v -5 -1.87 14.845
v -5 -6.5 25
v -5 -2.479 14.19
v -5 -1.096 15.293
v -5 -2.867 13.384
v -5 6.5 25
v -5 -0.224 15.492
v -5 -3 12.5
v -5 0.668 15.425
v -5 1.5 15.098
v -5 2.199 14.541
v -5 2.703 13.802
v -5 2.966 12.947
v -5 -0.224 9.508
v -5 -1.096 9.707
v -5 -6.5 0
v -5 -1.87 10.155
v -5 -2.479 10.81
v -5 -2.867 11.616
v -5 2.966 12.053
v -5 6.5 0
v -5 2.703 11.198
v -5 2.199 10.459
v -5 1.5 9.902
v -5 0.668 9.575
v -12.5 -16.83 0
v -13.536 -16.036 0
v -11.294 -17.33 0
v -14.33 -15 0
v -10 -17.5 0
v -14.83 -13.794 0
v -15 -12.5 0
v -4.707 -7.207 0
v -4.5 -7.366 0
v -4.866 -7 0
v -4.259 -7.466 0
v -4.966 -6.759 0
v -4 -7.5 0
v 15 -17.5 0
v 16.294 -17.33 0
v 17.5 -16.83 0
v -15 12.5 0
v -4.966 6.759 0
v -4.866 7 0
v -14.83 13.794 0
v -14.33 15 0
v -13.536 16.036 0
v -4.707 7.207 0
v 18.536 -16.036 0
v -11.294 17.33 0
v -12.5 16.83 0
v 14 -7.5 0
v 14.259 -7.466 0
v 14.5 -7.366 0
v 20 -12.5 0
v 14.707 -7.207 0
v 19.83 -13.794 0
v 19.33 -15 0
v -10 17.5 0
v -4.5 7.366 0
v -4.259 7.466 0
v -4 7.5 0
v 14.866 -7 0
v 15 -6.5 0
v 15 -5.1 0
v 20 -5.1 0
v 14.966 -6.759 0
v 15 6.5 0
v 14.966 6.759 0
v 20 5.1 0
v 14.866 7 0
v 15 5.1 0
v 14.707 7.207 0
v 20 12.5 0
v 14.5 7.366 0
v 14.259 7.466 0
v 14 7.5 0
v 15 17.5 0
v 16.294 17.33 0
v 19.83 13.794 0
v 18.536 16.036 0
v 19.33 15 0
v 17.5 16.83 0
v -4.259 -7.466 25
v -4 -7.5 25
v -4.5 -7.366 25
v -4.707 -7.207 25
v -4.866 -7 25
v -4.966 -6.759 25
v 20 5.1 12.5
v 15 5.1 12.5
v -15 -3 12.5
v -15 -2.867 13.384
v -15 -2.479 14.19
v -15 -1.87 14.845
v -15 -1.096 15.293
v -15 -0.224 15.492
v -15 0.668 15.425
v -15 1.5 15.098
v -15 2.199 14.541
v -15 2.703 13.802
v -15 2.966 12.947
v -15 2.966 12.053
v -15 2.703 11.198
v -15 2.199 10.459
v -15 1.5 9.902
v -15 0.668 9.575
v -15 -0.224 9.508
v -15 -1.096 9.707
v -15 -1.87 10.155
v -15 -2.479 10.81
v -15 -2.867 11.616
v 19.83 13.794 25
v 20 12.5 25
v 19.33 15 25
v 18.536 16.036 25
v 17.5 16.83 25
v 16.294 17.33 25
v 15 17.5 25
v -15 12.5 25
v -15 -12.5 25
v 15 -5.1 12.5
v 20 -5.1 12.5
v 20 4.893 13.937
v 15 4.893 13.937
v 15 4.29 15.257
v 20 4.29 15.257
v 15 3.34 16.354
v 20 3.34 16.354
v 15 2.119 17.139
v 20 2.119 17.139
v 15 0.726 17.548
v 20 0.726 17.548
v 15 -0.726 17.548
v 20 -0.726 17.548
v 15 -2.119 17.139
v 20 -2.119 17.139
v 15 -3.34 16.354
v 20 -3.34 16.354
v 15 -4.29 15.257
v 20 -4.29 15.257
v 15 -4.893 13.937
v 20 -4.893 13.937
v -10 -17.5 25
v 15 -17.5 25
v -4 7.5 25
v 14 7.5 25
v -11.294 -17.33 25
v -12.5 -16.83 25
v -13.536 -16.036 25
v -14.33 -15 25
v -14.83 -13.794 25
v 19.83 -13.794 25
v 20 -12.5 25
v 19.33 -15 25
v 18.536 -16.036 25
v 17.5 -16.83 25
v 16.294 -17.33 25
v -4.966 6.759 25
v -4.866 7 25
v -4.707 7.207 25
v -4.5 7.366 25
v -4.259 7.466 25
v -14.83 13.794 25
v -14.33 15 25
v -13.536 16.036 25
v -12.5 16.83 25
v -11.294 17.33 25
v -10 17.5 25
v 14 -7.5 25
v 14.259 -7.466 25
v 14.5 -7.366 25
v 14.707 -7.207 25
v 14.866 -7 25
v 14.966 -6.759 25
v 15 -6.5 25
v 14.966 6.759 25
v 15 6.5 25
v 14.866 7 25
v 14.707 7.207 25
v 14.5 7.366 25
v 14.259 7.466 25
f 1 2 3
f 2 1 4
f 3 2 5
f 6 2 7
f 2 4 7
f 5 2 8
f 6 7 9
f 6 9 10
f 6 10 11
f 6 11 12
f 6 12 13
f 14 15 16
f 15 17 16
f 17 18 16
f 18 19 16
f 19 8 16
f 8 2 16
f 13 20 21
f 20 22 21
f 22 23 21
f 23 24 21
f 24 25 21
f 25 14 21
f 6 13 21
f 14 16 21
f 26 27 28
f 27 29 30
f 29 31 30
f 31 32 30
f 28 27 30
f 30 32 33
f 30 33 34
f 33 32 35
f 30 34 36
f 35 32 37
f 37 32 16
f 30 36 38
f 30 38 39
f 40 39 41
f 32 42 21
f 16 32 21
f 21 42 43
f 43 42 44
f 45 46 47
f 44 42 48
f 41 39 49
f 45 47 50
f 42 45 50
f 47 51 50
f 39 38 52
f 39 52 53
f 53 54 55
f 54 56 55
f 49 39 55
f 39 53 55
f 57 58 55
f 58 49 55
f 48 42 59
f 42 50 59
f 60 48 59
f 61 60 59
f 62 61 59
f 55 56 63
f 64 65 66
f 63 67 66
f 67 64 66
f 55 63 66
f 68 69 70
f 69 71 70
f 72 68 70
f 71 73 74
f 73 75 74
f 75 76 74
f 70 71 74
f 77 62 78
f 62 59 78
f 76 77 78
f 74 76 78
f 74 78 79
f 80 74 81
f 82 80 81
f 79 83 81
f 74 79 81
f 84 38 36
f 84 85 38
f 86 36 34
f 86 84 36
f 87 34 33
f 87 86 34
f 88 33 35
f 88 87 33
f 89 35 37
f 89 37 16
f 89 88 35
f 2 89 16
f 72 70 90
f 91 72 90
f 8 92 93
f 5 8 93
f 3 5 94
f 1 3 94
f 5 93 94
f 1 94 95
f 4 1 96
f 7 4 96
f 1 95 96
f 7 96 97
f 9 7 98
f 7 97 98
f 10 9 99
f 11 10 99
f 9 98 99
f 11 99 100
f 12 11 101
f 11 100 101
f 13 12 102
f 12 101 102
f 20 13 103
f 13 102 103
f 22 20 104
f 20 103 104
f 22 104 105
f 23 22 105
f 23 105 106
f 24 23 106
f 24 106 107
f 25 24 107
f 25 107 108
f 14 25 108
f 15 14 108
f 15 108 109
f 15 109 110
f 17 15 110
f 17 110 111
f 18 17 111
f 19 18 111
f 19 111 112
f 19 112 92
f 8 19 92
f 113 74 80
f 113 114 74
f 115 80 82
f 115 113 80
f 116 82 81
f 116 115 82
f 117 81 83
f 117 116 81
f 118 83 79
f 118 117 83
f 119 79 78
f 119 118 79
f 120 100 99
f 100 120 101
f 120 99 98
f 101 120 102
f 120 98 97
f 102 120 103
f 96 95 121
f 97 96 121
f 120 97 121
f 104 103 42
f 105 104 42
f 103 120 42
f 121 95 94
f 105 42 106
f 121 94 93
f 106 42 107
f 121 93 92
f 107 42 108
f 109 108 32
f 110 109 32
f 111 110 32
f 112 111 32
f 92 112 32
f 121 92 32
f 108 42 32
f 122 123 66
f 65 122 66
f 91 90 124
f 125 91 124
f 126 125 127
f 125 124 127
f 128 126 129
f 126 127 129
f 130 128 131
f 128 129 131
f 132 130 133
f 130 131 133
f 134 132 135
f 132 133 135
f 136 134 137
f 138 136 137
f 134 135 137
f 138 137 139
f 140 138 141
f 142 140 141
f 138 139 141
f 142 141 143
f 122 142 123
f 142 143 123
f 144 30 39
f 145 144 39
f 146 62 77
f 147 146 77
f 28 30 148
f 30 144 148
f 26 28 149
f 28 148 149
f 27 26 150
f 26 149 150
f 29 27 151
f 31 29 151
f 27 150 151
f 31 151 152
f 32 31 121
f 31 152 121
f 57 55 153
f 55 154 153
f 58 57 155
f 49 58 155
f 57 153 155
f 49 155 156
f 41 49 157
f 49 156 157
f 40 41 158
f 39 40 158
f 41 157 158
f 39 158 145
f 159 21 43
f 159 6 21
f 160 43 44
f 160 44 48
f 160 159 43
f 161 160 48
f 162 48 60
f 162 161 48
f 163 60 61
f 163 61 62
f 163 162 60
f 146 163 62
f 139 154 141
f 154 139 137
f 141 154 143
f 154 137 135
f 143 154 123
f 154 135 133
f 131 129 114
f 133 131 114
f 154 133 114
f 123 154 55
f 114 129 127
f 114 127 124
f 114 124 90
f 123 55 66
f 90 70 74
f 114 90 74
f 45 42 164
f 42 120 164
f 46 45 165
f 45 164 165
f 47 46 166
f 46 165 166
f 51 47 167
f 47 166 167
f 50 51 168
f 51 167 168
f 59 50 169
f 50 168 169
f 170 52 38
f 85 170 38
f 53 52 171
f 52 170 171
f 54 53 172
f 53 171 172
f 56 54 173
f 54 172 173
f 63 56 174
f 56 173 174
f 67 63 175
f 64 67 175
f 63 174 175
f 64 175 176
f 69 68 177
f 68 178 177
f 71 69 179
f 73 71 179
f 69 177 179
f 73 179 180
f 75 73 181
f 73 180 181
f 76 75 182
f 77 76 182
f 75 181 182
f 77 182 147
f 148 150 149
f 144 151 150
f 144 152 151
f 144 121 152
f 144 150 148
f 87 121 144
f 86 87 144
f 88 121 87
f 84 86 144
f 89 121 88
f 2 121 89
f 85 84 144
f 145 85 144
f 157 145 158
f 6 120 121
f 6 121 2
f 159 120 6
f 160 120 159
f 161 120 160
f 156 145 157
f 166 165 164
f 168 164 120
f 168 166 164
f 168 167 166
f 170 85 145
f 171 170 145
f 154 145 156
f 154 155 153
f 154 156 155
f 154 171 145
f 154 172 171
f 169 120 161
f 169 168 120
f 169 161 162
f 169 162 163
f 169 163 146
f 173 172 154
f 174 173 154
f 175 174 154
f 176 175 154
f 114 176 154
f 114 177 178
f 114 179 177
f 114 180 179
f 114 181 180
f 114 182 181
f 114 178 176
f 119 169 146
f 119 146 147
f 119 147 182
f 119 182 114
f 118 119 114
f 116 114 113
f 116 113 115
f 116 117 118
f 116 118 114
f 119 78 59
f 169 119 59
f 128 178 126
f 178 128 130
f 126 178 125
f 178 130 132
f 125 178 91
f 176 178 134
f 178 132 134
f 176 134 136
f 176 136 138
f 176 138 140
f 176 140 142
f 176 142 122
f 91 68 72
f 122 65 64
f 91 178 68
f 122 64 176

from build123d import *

# Parameters (mm, degrees)
F0_W     = 10
F0_H     = 15
F0_W_2   = 5
F0_H_2   = 10.2
F1_DEPTH = 25
F3_DEPTH = 15
F4_R     = 3
F5_DEPTH = 25
F6_R     = 1
F7_R     = 5


with BuildPart() as f1:
    # F0 (on Top) → F1 (new body)
    with BuildSketch(Plane.XY):
        Polygon((15, -17.5), (15, -7.5), (-5, -7.5), (-15, -7.5), (-15, -17.5), align=None)
        with Locations((-10, 0)):
            Rectangle(F0_W, F0_H)
        Polygon((-15, 7.5), (-5, 7.5), (15, 7.5), (15, 17.5), (-15, 17.5), align=None)
        Polygon((15, 7.5), (15, 5.1), (20, 5.1), (20, 17.5), (15, 17.5), align=None)
        with Locations((17.5, 0)):
            Rectangle(F0_W_2, F0_H_2)
        Polygon((15, -5.1), (15, -7.5), (15, -17.5), (20, -17.5), (20, -5.1), align=None)
    extrude(amount=F1_DEPTH)

    # F2 (on face) → F3 (cut)
    with BuildSketch(Plane.YZ.offset(20)):
        with BuildLine():
            ThreePointArc((-5.1, 12.5), (0, 7.4), (5.1, 12.5))
            ThreePointArc((5.1, 12.5), (0, 17.6), (-5.1, 12.5))
        make_face()
        with BuildLine():
            Line((5.1, 0), (5.1, 12.5))
            ThreePointArc((5.1, 12.5), (0, 7.4), (-5.1, 12.5))
            Line((-5.1, 12.5), (-5.1, 0))
            Line((-5.1, 0), (5.1, 0))
        make_face()
    extrude(amount=-F3_DEPTH, mode=Mode.SUBTRACT)

    # F4 (on face) → F5 (cut)
    with BuildSketch(Plane(origin=(-15, 0, 0), x_dir=(0, -1, 0), z_dir=(-1, 0, 0))):
        with Locations((0, 12.5)):
            Circle(F4_R)
    extrude(amount=-F5_DEPTH, mode=Mode.SUBTRACT)

    # F6
    f6_edges = [f1.edges().sort_by_distance(p)[0] for p in [
        (15, -7.5, 12.5),
        (15, 7.5, 12.5),
        (-5, -7.5, 12.5),
        (-5, 7.5, 12.5),
    ]]
    fillet(f6_edges, radius=F6_R)

    # F7
    f7_edges = [f1.edges().sort_by_distance(p)[0] for p in [
        (20, 17.5, 12.5),
        (20, -17.5, 12.5),
        (-15, -17.5, 12.5),
        (-15, 17.5, 12.5),
    ]]
    fillet(f7_edges, radius=F7_R)


solid = f1.part
